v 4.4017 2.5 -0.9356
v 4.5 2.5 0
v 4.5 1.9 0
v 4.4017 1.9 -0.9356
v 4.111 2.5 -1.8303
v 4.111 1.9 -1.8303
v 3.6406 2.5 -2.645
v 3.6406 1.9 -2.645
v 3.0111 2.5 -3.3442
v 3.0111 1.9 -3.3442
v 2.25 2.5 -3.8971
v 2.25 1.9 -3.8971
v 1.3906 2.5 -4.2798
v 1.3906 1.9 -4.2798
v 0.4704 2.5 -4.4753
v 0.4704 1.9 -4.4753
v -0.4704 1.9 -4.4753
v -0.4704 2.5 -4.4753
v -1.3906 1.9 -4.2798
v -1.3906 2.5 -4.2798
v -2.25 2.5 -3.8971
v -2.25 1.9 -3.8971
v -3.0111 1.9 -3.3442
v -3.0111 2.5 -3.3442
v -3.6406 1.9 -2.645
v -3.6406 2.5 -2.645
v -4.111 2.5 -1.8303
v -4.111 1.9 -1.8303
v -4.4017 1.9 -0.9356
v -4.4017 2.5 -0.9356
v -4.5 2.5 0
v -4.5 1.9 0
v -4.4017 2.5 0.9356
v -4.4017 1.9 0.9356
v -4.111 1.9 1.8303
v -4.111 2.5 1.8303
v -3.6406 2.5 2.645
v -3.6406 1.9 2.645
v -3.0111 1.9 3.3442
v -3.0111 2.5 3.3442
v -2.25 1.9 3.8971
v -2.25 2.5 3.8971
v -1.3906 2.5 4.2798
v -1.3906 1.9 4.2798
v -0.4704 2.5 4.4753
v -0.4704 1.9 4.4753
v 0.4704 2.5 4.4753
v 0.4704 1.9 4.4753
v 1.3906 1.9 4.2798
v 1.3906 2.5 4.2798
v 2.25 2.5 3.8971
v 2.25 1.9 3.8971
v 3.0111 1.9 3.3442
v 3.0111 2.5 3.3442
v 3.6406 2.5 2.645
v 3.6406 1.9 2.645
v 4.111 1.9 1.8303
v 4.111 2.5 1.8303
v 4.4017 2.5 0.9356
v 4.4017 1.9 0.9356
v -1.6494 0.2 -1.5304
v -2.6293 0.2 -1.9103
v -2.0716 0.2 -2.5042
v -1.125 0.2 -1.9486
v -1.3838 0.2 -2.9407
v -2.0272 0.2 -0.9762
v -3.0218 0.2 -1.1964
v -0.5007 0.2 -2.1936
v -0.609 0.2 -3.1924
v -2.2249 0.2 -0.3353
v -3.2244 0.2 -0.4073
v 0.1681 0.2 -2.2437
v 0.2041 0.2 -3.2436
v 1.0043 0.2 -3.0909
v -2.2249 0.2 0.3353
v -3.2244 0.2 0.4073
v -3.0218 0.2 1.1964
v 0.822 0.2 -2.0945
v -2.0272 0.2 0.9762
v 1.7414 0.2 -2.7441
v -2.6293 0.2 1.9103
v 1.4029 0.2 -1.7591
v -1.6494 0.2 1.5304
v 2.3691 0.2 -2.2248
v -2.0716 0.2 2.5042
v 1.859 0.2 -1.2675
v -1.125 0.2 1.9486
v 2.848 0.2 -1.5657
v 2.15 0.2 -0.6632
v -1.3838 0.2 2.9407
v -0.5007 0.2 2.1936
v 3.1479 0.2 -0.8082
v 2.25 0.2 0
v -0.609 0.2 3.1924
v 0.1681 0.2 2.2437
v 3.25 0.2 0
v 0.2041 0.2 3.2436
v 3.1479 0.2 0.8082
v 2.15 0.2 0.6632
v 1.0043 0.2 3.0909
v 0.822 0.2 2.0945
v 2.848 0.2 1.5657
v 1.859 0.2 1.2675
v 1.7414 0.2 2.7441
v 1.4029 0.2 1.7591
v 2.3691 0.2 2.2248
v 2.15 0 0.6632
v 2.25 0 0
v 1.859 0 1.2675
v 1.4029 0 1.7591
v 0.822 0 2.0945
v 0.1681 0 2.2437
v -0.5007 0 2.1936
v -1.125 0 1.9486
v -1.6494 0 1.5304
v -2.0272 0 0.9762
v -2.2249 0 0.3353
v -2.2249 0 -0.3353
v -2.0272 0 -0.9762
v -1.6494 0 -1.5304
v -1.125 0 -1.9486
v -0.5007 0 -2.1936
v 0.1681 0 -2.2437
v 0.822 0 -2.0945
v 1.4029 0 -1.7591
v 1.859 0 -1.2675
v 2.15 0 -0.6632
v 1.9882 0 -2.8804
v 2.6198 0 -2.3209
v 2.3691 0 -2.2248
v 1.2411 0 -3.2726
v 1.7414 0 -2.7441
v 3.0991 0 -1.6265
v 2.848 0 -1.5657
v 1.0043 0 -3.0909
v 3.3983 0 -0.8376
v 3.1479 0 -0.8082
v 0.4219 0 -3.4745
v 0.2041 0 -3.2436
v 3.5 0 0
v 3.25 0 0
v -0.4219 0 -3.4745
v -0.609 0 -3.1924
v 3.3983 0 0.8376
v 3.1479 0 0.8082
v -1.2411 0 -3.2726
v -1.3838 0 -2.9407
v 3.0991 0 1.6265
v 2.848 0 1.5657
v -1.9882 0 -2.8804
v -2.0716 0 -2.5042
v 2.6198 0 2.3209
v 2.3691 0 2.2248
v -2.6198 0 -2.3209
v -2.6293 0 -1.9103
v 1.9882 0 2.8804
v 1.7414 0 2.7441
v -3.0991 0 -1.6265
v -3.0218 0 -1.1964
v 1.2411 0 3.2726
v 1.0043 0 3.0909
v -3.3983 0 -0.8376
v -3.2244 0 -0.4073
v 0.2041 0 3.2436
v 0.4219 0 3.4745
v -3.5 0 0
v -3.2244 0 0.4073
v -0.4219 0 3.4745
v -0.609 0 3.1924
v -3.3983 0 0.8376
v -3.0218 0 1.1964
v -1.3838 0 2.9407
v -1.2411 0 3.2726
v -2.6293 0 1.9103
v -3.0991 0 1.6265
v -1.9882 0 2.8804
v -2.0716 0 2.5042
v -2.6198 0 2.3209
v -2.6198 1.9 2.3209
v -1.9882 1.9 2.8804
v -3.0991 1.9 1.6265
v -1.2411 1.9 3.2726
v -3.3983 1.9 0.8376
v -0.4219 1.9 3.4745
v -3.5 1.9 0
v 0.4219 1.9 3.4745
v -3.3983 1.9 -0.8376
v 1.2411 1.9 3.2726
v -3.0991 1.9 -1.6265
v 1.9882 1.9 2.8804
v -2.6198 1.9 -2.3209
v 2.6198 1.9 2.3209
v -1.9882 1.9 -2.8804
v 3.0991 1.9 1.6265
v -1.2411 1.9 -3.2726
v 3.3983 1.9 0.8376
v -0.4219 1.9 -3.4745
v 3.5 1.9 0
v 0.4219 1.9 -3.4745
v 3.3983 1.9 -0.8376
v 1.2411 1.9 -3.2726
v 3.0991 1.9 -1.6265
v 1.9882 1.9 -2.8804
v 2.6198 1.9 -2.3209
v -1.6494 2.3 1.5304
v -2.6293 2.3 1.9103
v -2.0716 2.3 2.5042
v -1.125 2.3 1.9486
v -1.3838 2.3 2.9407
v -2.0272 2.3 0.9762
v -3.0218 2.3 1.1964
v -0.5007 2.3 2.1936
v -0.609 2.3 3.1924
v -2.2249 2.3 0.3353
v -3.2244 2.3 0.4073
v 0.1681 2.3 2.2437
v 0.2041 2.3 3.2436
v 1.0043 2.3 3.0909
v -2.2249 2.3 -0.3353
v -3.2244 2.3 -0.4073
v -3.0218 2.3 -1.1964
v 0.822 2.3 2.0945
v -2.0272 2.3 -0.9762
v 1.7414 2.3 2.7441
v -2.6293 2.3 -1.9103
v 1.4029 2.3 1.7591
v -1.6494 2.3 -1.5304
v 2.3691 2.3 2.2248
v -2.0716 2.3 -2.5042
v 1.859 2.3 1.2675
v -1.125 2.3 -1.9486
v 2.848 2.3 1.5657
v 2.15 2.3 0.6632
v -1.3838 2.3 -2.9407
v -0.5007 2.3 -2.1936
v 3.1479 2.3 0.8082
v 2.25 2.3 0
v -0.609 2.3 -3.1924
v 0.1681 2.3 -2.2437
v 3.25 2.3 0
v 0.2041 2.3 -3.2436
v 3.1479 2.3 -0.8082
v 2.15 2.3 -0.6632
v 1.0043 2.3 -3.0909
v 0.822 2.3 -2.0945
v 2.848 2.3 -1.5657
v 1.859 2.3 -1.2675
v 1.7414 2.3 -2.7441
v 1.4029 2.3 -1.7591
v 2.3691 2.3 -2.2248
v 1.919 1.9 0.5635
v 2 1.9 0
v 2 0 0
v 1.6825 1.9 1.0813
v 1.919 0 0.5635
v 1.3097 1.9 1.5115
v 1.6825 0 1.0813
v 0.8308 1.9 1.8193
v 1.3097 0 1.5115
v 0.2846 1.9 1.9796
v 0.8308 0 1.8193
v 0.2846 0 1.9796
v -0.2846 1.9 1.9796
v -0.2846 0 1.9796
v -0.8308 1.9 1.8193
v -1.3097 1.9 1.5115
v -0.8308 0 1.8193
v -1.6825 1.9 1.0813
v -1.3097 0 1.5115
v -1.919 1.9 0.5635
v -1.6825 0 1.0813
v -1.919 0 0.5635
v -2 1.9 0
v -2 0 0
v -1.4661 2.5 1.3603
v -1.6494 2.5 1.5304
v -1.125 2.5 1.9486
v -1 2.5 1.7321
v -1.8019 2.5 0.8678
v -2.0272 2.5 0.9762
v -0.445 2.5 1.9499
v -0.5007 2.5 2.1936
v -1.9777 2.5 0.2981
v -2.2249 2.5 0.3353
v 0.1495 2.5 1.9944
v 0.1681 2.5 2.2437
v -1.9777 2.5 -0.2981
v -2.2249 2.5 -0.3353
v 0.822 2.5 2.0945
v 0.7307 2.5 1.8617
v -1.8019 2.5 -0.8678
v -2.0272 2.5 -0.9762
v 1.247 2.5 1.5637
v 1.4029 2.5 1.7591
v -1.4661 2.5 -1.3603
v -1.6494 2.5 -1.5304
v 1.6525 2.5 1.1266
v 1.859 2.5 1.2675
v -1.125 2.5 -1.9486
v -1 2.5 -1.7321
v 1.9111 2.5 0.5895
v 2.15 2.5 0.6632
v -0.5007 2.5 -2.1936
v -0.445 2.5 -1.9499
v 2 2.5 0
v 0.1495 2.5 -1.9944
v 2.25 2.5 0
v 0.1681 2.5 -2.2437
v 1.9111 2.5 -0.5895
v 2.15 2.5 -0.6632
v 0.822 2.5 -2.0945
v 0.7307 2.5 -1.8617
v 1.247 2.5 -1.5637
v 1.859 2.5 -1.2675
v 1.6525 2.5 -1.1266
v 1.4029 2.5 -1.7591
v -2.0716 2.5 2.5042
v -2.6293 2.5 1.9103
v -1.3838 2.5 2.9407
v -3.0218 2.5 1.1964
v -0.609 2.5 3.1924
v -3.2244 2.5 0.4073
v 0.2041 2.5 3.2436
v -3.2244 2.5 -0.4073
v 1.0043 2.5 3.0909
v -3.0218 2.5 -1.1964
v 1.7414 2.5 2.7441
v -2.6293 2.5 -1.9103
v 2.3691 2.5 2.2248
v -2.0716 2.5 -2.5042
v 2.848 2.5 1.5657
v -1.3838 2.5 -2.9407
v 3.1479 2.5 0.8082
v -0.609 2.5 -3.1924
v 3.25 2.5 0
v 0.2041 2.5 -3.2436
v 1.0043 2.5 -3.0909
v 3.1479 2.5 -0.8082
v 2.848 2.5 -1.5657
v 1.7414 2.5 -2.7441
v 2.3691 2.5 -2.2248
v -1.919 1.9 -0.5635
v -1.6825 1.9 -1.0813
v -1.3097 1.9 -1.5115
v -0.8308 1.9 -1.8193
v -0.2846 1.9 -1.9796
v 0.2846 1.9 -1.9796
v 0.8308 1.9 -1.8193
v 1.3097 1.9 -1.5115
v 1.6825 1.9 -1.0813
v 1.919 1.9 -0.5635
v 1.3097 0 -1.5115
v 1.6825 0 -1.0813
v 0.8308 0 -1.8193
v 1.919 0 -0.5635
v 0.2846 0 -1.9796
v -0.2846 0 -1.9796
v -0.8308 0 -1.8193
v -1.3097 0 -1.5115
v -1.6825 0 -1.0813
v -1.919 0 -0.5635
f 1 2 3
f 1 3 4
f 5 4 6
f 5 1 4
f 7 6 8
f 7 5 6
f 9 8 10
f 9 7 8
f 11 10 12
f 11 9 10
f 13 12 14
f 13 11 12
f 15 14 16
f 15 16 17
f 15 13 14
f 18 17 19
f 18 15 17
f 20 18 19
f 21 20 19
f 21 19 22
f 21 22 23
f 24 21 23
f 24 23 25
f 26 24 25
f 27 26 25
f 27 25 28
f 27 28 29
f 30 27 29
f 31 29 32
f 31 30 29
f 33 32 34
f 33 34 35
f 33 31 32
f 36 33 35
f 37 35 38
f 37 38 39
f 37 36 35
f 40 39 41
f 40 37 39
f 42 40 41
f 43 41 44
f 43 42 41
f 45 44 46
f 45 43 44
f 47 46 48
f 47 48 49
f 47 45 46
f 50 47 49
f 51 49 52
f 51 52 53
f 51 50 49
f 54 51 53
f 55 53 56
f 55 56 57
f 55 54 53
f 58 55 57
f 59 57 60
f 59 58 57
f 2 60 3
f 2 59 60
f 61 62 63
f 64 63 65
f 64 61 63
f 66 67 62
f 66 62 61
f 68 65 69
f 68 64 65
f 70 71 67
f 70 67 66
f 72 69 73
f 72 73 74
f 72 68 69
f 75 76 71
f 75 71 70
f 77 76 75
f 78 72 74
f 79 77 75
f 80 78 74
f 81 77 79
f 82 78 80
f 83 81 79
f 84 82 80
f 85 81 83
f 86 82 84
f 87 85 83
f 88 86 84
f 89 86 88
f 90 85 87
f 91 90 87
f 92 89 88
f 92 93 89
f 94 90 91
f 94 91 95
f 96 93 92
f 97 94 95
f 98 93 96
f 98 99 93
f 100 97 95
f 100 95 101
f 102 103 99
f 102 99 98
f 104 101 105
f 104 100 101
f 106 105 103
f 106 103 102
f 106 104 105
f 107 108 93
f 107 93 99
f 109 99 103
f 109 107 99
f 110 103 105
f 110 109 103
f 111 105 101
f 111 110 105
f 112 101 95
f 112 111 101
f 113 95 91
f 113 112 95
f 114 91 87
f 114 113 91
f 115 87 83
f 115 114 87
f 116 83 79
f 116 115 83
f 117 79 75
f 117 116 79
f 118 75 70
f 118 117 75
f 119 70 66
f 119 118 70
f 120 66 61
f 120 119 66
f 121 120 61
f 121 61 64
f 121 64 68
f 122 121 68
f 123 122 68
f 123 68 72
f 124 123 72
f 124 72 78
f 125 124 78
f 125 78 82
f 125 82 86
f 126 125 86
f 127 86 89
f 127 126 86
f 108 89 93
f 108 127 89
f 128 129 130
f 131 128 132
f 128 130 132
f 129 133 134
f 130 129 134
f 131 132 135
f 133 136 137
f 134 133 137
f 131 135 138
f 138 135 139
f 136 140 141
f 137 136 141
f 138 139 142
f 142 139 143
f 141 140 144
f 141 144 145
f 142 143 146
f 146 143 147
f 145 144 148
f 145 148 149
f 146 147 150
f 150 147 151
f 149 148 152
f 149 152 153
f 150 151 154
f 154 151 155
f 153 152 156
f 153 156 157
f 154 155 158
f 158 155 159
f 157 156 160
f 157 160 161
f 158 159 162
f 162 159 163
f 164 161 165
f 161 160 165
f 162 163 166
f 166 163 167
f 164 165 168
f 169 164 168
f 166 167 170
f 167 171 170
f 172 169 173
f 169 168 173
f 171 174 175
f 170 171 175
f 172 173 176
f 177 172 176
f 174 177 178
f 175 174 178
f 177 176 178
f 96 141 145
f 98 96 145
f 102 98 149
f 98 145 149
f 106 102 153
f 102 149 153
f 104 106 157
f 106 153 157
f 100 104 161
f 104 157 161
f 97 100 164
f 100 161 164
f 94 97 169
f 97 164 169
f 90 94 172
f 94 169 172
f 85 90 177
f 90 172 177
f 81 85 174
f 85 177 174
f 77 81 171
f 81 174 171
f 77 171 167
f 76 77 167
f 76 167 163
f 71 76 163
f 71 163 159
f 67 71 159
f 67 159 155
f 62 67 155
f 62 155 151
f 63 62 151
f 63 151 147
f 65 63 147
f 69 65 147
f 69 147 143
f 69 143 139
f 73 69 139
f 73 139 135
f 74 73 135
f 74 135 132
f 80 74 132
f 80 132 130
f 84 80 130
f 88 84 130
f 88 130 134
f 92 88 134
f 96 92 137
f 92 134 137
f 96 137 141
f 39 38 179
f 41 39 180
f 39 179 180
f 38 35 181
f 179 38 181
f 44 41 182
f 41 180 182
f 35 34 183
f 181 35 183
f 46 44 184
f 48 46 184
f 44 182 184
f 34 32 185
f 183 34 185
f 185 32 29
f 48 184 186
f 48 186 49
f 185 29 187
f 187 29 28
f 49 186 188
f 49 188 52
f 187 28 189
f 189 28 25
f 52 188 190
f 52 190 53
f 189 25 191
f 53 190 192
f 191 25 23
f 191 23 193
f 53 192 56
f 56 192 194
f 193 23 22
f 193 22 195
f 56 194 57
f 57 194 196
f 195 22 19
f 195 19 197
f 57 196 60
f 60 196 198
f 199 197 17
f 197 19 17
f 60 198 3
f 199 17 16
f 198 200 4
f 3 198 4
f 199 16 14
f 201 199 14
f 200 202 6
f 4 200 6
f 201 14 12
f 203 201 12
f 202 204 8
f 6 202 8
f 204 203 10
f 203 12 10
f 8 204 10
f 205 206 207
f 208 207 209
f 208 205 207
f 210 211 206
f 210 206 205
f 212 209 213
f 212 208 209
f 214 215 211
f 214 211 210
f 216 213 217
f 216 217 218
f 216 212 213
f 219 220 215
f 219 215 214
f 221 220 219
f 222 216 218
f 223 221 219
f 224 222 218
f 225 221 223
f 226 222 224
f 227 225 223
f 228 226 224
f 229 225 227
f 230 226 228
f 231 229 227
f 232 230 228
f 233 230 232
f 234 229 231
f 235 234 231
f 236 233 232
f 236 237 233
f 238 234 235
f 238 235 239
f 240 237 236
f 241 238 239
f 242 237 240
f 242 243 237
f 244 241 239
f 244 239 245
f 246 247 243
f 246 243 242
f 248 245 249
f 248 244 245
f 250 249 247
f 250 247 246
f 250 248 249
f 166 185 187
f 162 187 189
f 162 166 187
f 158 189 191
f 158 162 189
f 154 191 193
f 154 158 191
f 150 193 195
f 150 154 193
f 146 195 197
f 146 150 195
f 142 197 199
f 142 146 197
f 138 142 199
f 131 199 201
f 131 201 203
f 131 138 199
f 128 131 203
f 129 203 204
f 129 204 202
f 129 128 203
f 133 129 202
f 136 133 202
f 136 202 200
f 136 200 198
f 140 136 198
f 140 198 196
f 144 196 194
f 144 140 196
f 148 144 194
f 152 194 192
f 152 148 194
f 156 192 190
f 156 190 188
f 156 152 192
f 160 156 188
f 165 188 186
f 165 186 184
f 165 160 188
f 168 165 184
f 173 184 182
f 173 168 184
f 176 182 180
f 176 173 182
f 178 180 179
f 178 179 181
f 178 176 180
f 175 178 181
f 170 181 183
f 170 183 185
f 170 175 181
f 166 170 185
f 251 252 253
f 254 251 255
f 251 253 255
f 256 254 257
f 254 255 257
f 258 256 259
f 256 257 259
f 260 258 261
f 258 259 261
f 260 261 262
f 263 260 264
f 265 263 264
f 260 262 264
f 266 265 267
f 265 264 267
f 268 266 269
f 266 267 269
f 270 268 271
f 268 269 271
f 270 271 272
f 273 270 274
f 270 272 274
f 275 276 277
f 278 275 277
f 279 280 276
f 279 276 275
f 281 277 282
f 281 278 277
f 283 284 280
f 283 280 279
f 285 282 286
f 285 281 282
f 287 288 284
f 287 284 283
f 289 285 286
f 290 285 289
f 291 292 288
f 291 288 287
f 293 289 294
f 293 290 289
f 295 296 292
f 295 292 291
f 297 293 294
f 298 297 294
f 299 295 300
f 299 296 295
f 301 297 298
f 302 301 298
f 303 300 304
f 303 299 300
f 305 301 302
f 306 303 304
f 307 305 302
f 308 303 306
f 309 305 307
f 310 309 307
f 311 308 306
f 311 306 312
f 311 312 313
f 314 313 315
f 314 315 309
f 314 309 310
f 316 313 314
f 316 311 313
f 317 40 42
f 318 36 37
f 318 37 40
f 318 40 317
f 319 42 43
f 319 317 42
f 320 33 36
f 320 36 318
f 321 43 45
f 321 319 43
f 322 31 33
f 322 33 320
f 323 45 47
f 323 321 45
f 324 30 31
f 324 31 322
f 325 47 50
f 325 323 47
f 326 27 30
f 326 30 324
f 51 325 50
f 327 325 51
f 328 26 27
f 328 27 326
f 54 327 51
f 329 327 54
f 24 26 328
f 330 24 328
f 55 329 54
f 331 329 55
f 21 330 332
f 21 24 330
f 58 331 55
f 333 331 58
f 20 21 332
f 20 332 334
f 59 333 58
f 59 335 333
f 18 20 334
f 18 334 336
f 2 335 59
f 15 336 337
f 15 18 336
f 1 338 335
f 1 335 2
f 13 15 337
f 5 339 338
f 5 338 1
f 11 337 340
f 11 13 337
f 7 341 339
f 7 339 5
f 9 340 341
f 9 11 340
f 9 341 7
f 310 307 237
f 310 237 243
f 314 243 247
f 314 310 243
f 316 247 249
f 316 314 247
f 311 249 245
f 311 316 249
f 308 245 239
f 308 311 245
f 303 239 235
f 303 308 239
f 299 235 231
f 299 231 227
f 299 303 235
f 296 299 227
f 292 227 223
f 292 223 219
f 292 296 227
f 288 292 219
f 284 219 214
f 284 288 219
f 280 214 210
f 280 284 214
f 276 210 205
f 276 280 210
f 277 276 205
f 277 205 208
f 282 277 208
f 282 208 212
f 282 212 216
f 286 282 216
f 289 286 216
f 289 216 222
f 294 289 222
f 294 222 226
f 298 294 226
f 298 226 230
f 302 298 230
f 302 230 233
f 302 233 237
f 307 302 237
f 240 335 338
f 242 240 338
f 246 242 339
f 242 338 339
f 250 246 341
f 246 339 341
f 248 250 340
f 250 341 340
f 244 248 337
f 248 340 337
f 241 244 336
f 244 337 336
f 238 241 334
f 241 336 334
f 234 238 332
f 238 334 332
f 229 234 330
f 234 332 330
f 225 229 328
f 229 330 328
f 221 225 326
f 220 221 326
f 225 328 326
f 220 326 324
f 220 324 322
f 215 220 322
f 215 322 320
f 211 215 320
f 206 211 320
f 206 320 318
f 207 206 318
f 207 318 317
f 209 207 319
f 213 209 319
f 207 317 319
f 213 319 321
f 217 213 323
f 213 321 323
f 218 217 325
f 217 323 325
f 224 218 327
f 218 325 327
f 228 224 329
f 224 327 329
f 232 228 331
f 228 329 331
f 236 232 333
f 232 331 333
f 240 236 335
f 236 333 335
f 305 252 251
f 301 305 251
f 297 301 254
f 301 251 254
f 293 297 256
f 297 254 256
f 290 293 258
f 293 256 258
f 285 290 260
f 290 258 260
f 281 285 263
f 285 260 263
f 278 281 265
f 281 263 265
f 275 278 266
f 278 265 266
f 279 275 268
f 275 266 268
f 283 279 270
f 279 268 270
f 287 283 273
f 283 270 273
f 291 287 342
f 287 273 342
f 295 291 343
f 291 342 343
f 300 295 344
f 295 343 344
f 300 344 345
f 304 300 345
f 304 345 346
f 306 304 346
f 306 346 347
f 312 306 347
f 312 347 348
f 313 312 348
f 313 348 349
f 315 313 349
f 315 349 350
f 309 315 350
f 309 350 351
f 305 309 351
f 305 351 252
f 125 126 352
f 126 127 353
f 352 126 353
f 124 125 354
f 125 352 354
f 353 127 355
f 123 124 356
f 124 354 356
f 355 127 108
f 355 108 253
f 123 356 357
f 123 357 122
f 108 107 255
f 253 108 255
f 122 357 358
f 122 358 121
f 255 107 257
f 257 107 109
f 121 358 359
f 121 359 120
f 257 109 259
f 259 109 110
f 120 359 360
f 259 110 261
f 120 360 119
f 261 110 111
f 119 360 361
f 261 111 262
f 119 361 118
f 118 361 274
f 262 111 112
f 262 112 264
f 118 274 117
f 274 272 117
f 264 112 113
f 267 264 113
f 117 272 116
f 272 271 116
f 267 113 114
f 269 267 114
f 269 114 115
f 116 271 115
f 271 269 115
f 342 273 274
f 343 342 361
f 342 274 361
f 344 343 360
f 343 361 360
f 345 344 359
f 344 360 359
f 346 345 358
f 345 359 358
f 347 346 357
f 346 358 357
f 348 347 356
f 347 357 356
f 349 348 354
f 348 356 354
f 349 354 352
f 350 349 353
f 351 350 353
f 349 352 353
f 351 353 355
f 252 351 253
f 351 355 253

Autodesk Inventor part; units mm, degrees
ref_plane "YZ Plane" through (0, 0, 0) normal (1, 0, 0) x (0, 1, 0)
ref_plane "XZ Plane" through (0, 0, 0) normal (0, 1, 0) x (-1, 0, 0)
ref_plane "XY Plane" through (0, 0, 0) normal (0, 0, 1) x (1, 0, 0)
sketch "スケッチ1" plane through (0, 0, 0) normal (0, 1, 0) x (-1, 0, 0)
  circle A0 centre (0, 0) radius 2
  circle A1 centre (0, 0) radius 3.5
  circle A2 centre (0, 0) radius 4.25
  dimension "d0" = 4
  dimension "d1" = 7
  dimension "d2" = 8.5
extrude "押し出し1" add sketch "スケッチ1" along normal blind 2.5 contours A1
sketch "スケッチ2" plane through (0, 2.5, 0) normal (0, 1, 0) x (1, 0, 0)
  circle A0 centre (0, 0) radius 4.5
  dimension "d5" = 9
extrude "押し出し2" add sketch "スケッチ2" against normal blind 0.6
sketch "スケッチ3" plane through (0, 0, 0) normal (0, -1, 0) x (1, 0, 0)
  circle A0 centre (0, 0) radius 2
extrude "押し出し3" cut sketch "スケッチ3" against normal through all
sketch "スケッチ4" plane through (0, 2.5, 0) normal (0, 1, 0) x (1, 0, 0)
  circle A0 centre (0, 0) radius 4.5 projected
  circle A1 centre (0, 0) radius 2.25
  circle A2 centre (0, 0) radius 3.25
  dimension "d10" = 4.5
  dimension "d11" = 6.5
extrude "押し出し4" cut sketch "スケッチ4" against normal blind 0.2 contours A2
sketch "スケッチ5" plane through (0, 0, 0) normal (0, -1, 0) x (1, 0, 0)
  circle A0 centre (0, 0) radius 2.25 projected
  circle A1 centre (0, 0) radius 3.25 projected
extrude "押し出し5" cut sketch "スケッチ5" against normal blind 0.2
properties part number "ベアリング3-7" material "アルミニウム 6061"
